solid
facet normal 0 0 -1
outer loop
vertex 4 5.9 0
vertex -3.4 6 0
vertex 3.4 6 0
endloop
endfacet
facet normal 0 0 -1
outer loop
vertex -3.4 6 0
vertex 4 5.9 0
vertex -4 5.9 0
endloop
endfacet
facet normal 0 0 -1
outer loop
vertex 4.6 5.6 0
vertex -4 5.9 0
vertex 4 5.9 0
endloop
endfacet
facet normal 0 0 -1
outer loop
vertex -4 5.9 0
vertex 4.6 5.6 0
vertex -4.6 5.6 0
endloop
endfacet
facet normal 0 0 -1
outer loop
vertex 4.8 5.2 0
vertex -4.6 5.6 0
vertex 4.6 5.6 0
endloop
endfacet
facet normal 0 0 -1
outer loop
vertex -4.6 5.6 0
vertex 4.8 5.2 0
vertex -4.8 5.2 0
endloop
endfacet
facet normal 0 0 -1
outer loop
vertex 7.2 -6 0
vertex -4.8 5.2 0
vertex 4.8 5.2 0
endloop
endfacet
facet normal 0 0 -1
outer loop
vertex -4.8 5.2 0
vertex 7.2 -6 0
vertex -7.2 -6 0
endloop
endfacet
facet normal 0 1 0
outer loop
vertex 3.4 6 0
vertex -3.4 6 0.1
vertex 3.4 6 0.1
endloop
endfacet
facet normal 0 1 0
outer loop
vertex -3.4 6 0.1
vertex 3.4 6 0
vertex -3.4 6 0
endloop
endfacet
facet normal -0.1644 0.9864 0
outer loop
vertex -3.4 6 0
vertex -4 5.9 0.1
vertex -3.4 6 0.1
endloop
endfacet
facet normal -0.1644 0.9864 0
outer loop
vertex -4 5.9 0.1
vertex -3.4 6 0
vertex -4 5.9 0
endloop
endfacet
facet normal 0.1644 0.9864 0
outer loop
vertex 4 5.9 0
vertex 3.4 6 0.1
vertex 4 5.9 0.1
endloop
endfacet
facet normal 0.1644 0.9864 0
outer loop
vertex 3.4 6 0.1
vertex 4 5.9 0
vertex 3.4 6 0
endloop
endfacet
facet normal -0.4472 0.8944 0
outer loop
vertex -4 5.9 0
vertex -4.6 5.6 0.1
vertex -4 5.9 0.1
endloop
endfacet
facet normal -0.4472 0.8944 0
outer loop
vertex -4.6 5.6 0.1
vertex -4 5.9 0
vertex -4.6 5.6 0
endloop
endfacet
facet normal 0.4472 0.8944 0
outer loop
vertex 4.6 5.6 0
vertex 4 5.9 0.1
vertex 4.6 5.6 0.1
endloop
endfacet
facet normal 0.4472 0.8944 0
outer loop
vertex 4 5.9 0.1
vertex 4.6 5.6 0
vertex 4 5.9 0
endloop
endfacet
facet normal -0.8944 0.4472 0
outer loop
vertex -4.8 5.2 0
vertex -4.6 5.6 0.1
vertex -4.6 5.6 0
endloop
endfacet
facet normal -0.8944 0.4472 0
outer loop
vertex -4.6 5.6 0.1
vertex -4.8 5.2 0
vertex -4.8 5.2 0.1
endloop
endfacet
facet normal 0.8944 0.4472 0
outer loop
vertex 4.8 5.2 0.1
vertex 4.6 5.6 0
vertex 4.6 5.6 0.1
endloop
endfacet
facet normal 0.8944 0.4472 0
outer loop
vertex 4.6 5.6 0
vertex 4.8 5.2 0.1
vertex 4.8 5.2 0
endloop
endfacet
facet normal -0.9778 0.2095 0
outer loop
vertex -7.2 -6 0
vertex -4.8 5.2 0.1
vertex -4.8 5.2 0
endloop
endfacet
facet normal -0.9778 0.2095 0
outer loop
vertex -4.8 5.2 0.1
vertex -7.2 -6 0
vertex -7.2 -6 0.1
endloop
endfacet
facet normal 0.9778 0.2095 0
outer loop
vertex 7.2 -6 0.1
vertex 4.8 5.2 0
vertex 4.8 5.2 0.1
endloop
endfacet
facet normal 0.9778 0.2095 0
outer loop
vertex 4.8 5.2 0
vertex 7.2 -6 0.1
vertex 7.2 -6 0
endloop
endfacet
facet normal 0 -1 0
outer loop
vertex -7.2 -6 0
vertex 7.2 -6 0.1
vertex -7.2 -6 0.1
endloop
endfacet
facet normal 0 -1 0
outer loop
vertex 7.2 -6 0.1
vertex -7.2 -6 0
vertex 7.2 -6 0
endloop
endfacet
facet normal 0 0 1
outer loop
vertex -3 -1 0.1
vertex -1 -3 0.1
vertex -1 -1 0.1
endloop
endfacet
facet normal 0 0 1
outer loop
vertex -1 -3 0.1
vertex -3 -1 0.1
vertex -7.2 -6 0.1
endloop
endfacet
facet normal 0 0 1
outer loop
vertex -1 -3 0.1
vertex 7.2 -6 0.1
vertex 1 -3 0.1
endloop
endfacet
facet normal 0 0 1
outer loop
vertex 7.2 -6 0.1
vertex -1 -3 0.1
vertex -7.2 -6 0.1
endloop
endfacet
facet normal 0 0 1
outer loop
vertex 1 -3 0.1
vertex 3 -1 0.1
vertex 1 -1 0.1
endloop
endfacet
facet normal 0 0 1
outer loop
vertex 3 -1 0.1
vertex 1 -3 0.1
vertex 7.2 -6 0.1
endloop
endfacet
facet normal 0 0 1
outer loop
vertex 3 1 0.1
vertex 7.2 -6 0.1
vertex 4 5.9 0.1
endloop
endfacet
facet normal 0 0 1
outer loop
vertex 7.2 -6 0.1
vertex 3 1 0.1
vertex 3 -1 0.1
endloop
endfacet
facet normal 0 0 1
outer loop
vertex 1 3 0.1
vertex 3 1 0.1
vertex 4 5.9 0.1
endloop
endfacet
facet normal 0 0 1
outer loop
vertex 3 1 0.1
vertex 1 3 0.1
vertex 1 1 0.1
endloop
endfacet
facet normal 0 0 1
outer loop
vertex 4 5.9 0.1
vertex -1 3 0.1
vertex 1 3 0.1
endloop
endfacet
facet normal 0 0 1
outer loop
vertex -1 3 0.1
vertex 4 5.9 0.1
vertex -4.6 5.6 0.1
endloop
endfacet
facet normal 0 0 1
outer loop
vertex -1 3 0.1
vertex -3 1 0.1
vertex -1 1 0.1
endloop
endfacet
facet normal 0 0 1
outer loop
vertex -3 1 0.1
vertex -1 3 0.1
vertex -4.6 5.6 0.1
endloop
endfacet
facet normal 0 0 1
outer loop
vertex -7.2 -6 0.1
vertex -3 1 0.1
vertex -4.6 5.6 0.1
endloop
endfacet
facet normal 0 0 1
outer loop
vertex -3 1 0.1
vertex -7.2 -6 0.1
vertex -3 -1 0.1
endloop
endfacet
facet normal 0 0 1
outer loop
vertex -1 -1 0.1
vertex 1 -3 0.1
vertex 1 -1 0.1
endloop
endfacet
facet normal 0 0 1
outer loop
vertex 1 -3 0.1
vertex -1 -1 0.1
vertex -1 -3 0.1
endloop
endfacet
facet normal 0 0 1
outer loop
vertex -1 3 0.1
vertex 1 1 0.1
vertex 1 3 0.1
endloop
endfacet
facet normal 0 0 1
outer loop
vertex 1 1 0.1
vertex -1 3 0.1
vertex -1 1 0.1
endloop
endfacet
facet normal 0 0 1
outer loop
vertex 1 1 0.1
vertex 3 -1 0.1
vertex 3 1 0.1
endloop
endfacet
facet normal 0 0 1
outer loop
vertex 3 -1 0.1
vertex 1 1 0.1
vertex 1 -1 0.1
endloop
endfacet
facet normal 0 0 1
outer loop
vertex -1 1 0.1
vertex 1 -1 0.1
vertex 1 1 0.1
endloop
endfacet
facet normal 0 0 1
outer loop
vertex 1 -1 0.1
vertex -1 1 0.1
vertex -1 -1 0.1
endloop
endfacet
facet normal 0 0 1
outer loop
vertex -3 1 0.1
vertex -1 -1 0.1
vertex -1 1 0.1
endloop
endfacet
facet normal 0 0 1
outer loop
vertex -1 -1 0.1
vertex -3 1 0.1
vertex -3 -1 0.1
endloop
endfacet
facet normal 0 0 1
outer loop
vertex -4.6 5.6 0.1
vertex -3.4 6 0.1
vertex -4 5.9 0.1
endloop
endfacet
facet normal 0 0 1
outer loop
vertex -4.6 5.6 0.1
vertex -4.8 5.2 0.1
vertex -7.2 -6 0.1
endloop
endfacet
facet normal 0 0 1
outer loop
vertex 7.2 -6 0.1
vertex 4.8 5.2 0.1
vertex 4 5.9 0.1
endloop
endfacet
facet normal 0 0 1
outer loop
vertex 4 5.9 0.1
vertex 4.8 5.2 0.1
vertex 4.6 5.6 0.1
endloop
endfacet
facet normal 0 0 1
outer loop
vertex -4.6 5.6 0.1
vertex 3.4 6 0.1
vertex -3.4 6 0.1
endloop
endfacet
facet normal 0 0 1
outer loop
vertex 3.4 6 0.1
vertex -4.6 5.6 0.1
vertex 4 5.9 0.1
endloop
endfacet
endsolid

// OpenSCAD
// file: s/004315s01.scad
use <../../lib.scad>
function ldraw_lib__s__004315s01() = [
// 0 ~Sticker for Minifig Torso without Top Surface
// 0 Name: s\004315s01.dat
// 0 Author: Michael Heidemann [mikeheide]
// 0 !LDRAW_ORG Subpart UPDATE 2018-02
// 0 !LICENSE Licensed under CC BY 2.0 and CC BY 4.0 : see CAreadme.txt
// 
// 0 BFC CERTIFY CCW
  [0,"BFC","CERTIFY"],
  [0,"BFC","CCW"],
// 
// 0 !HISTORY 2011-12-29 [PTadmin] Official Update 2011-02
// 0 !HISTORY 2017-07-04 [cwdee] Add conditional lines in border
// 0 !HISTORY 2018-12-08 [PTadmin] Official Update 2018-02
// 
// 
// 0 // Back
// 
// 4 16 8.5 0 15 10 0 14.75 -10 0 14.75 -8.5 0 15
  [4,16,8.5,0,15,10,0,14.75,-10,0,14.75,-8.5,0,15],
// 4 16 10 0 14.75 11.5 0 14 -11.5 0 14 -10 0 14.75
  [4,16,10,0,14.75,11.5,0,14,-11.5,0,14,-10,0,14.75],
// 4 16 11.5 0 14 12 0 13 -12 0 13 -11.5 0 14
  [4,16,11.5,0,14,12,0,13,-12,0,13,-11.5,0,14],
// 4 16 12 0 13 18 0 -15 -18 0 -15 -12 0 13
  [4,16,12,0,13,18,0,-15,-18,0,-15,-12,0,13],
// 0 // Border
// 4 16 8.5 0 15 -8.5 0 15 -8.5 -0.25 15 8.5 -0.25 15
  [4,16,8.5,0,15,-8.5,0,15,-8.5,-0.25,15,8.5,-0.25,15],
// 4 16 -8.5 0 15 -10 0 14.75 -10 -0.25 14.75 -8.5 -0.25 15
  [4,16,-8.5,0,15,-10,0,14.75,-10,-0.25,14.75,-8.5,-0.25,15],
// 4 16 8.5 -0.25 15 10 -0.25 14.75 10 0 14.75 8.5 0 15
  [4,16,8.5,-0.25,15,10,-0.25,14.75,10,0,14.75,8.5,0,15],
// 4 16 -10 0 14.75 -11.5 0 14 -11.5 -0.25 14 -10 -0.25 14.75
  [4,16,-10,0,14.75,-11.5,0,14,-11.5,-0.25,14,-10,-0.25,14.75],
// 4 16 10 -0.25 14.75 11.5 -0.25 14 11.5 0 14 10 0 14.75
  [4,16,10,-0.25,14.75,11.5,-0.25,14,11.5,0,14,10,0,14.75],
// 4 16 -11.5 0 14 -12 0 13 -12 -0.25 13 -11.5 -0.25 14
  [4,16,-11.5,0,14,-12,0,13,-12,-0.25,13,-11.5,-0.25,14],
// 4 16 11.5 -0.25 14 12 -0.25 13 12 0 13 11.5 0 14
  [4,16,11.5,-0.25,14,12,-0.25,13,12,0,13,11.5,0,14],
// 4 16 -18 -0.25 -15 -12 -0.25 13 -12 0 13 -18 0 -15
  [4,16,-18,-0.25,-15,-12,-0.25,13,-12,0,13,-18,0,-15],
// 4 16 18 0 -15 12 0 13 12 -0.25 13 18 -0.25 -15
  [4,16,18,0,-15,12,0,13,12,-0.25,13,18,-0.25,-15],
// 4 16 -18 0 -15 18 0 -15 18 -0.25 -15 -18 -0.25 -15
  [4,16,-18,0,-15,18,0,-15,18,-0.25,-15,-18,-0.25,-15],
// 0 // Border conditional lines
// 5 24 8.5 0 15 8.5 -0.25 15 0 0 15 10 0 14.75
  [5,24,8.5,0,15,8.5,-0.25,15,0,0,15,10,0,14.75],
// 5 24 10 0 14.75 10 -0.25 14.75 8.5 0 15 11.5 0 14
  [5,24,10,0,14.75,10,-0.25,14.75,8.5,0,15,11.5,0,14],
// 5 24 11.5 0 14 11.5 -0.25 14 10 0 14.75 12 0 13
  [5,24,11.5,0,14,11.5,-0.25,14,10,0,14.75,12,0,13],
// 5 24 12 0 13 12 -0.25 13 11.5 0 14 18 0 -15
  [5,24,12,0,13,12,-0.25,13,11.5,0,14,18,0,-15],
// 5 24 -8.5 0 15 -8.5 -0.25 15 0 0 15 -10 0 14.75
  [5,24,-8.5,0,15,-8.5,-0.25,15,0,0,15,-10,0,14.75],
// 5 24 -10 0 14.75 -10 -0.25 14.75 -8.5 0 15 -11.5 0 14
  [5,24,-10,0,14.75,-10,-0.25,14.75,-8.5,0,15,-11.5,0,14],
// 5 24 -11.5 0 14 -11.5 -0.25 14 -10 0 14.75 -12 0 13
  [5,24,-11.5,0,14,-11.5,-0.25,14,-10,0,14.75,-12,0,13],
// 5 24 -12 0 13 -12 -0.25 13 -11.5 0 14 -18 0 -15
  [5,24,-12,0,13,-12,-0.25,13,-11.5,0,14,-18,0,-15],
];
makepoly(ldraw_lib__s__004315s01(), line=0.2);
// main file
use <../lib.scad>
use <s/004315s01.scad>
function ldraw_lib__004363a() = [
// 0 Sticker Minifig Torso with Red Cross Logo
// 0 Name: 004363a.dat
// 0 Author: Takeshi Takahashi [RainbowDolphin]
// 0 !LDRAW_ORG Part UPDATE 2020-03
// 0 !LICENSE Licensed under CC BY 2.0 and CC BY 4.0 : see CAreadme.txt
// 
// 0 BFC CERTIFY CCW
  [0,"BFC","CERTIFY"],
  [0,"BFC","CCW"],
// 
// 0 !KEYWORDS Set 606, Set 623
// 
// 0 !HISTORY 2020-11-08 [RainbowDolphin] Created based on 004511b by J.C. Tchang [tchang]
// 0 !HISTORY 2020-12-29 [PTadmin] Official Update 2020-03
// 
// 
// 1 16 0 0 0 1 0 0 0 1 0 0 0 1 s\004315s01.dat
  [1,16,0,0,0,1,0,0,0,1,0,0,0,1, ldraw_lib__s__004315s01()],
// 4 15 -18 -.25 -15 -2.5 -.25 -7.5 -2.5 -.25 -2.5 -7.5 -.25 -2.5
  [4,15,-18,-.25,-15,-2.5,-.25,-7.5,-2.5,-.25,-2.5,-7.5,-.25,-2.5],
// 4 15 -18 -.25 -15 18 -.25 -15 2.5 -.25 -7.5 -2.5 -.25 -7.5
  [4,15,-18,-.25,-15,18,-.25,-15,2.5,-.25,-7.5,-2.5,-.25,-7.5],
// 4 15 18 -.25 -15 7.5 -.25 -2.5 2.5 -.25 -2.5 2.5 -.25 -7.5
  [4,15,18,-.25,-15,7.5,-.25,-2.5,2.5,-.25,-2.5,2.5,-.25,-7.5],
// 4 15 18 -.25 -15 10 -.25 14.75 7.5 -.25 2.5 7.5 -.25 -2.5
  [4,15,18,-.25,-15,10,-.25,14.75,7.5,-.25,2.5,7.5,-.25,-2.5],
// 4 15 10 -.25 14.75 2.5 -.25 7.5 2.5 -.25 2.5 7.5 -.25 2.5
  [4,15,10,-.25,14.75,2.5,-.25,7.5,2.5,-.25,2.5,7.5,-.25,2.5],
// 4 15 10 -.25 14.75 -11.5 -.25 14 -2.5 -.25 7.5 2.5 -.25 7.5
  [4,15,10,-.25,14.75,-11.5,-.25,14,-2.5,-.25,7.5,2.5,-.25,7.5],
// 4 15 -11.5 -.25 14 -7.5 -.25 2.5 -2.5 -.25 2.5 -2.5 -.25 7.5
  [4,15,-11.5,-.25,14,-7.5,-.25,2.5,-2.5,-.25,2.5,-2.5,-.25,7.5],
// 4 15 -18 -.25 -15 -7.5 -.25 -2.5 -7.5 -.25 2.5 -11.5 -.25 14
  [4,15,-18,-.25,-15,-7.5,-.25,-2.5,-7.5,-.25,2.5,-11.5,-.25,14],
// 4 4 -2.5 -0.25 -7.5 2.5 -0.25 -7.5 2.5 -0.25 -2.5 -2.5 -0.25 -2.5
  [4,4,-2.5,-0.25,-7.5,2.5,-0.25,-7.5,2.5,-0.25,-2.5,-2.5,-0.25,-2.5],
// 4 4 -2.5 -0.25 2.5 2.5 -0.25 2.5 2.5 -0.25 7.5 -2.5 -0.25 7.5
  [4,4,-2.5,-0.25,2.5,2.5,-0.25,2.5,2.5,-0.25,7.5,-2.5,-0.25,7.5],
// 4 4 7.5 -0.25 -2.5 7.5 -0.25 2.5 2.5 -0.25 2.5 2.5 -0.25 -2.5
  [4,4,7.5,-0.25,-2.5,7.5,-0.25,2.5,2.5,-0.25,2.5,2.5,-0.25,-2.5],
// 4 4 2.5 -0.25 -2.5 2.5 -0.25 2.5 -2.5 -0.25 2.5 -2.5 -0.25 -2.5
  [4,4,2.5,-0.25,-2.5,2.5,-0.25,2.5,-2.5,-0.25,2.5,-2.5,-0.25,-2.5],
// 4 4 -2.5 -0.25 -2.5 -2.5 -0.25 2.5 -7.5 -0.25 2.5 -7.5 -0.25 -2.5
  [4,4,-2.5,-0.25,-2.5,-2.5,-0.25,2.5,-7.5,-0.25,2.5,-7.5,-0.25,-2.5],
// 3 15 -11.5 -.25 14 -8.5 -.25 15 -10 -.25 14.75
  [3,15,-11.5,-.25,14,-8.5,-.25,15,-10,-.25,14.75],
// 3 15 -11.5 -.25 14 -12 -.25 13 -18 -.25 -15
  [3,15,-11.5,-.25,14,-12,-.25,13,-18,-.25,-15],
// 3 15 18 -.25 -15 12 -.25 13 10 -.25 14.75
  [3,15,18,-.25,-15,12,-.25,13,10,-.25,14.75],
// 3 15 10 -.25 14.75 12 -.25 13 11.5 -.25 14
  [3,15,10,-.25,14.75,12,-.25,13,11.5,-.25,14],
// 4 15 -8.5 -.25 15 -11.5 -.25 14 10 -.25 14.75 8.5 -.25 15
  [4,15,-8.5,-.25,15,-11.5,-.25,14,10,-.25,14.75,8.5,-.25,15],
];
makepoly(ldraw_lib__004363a(), line=0.2);
